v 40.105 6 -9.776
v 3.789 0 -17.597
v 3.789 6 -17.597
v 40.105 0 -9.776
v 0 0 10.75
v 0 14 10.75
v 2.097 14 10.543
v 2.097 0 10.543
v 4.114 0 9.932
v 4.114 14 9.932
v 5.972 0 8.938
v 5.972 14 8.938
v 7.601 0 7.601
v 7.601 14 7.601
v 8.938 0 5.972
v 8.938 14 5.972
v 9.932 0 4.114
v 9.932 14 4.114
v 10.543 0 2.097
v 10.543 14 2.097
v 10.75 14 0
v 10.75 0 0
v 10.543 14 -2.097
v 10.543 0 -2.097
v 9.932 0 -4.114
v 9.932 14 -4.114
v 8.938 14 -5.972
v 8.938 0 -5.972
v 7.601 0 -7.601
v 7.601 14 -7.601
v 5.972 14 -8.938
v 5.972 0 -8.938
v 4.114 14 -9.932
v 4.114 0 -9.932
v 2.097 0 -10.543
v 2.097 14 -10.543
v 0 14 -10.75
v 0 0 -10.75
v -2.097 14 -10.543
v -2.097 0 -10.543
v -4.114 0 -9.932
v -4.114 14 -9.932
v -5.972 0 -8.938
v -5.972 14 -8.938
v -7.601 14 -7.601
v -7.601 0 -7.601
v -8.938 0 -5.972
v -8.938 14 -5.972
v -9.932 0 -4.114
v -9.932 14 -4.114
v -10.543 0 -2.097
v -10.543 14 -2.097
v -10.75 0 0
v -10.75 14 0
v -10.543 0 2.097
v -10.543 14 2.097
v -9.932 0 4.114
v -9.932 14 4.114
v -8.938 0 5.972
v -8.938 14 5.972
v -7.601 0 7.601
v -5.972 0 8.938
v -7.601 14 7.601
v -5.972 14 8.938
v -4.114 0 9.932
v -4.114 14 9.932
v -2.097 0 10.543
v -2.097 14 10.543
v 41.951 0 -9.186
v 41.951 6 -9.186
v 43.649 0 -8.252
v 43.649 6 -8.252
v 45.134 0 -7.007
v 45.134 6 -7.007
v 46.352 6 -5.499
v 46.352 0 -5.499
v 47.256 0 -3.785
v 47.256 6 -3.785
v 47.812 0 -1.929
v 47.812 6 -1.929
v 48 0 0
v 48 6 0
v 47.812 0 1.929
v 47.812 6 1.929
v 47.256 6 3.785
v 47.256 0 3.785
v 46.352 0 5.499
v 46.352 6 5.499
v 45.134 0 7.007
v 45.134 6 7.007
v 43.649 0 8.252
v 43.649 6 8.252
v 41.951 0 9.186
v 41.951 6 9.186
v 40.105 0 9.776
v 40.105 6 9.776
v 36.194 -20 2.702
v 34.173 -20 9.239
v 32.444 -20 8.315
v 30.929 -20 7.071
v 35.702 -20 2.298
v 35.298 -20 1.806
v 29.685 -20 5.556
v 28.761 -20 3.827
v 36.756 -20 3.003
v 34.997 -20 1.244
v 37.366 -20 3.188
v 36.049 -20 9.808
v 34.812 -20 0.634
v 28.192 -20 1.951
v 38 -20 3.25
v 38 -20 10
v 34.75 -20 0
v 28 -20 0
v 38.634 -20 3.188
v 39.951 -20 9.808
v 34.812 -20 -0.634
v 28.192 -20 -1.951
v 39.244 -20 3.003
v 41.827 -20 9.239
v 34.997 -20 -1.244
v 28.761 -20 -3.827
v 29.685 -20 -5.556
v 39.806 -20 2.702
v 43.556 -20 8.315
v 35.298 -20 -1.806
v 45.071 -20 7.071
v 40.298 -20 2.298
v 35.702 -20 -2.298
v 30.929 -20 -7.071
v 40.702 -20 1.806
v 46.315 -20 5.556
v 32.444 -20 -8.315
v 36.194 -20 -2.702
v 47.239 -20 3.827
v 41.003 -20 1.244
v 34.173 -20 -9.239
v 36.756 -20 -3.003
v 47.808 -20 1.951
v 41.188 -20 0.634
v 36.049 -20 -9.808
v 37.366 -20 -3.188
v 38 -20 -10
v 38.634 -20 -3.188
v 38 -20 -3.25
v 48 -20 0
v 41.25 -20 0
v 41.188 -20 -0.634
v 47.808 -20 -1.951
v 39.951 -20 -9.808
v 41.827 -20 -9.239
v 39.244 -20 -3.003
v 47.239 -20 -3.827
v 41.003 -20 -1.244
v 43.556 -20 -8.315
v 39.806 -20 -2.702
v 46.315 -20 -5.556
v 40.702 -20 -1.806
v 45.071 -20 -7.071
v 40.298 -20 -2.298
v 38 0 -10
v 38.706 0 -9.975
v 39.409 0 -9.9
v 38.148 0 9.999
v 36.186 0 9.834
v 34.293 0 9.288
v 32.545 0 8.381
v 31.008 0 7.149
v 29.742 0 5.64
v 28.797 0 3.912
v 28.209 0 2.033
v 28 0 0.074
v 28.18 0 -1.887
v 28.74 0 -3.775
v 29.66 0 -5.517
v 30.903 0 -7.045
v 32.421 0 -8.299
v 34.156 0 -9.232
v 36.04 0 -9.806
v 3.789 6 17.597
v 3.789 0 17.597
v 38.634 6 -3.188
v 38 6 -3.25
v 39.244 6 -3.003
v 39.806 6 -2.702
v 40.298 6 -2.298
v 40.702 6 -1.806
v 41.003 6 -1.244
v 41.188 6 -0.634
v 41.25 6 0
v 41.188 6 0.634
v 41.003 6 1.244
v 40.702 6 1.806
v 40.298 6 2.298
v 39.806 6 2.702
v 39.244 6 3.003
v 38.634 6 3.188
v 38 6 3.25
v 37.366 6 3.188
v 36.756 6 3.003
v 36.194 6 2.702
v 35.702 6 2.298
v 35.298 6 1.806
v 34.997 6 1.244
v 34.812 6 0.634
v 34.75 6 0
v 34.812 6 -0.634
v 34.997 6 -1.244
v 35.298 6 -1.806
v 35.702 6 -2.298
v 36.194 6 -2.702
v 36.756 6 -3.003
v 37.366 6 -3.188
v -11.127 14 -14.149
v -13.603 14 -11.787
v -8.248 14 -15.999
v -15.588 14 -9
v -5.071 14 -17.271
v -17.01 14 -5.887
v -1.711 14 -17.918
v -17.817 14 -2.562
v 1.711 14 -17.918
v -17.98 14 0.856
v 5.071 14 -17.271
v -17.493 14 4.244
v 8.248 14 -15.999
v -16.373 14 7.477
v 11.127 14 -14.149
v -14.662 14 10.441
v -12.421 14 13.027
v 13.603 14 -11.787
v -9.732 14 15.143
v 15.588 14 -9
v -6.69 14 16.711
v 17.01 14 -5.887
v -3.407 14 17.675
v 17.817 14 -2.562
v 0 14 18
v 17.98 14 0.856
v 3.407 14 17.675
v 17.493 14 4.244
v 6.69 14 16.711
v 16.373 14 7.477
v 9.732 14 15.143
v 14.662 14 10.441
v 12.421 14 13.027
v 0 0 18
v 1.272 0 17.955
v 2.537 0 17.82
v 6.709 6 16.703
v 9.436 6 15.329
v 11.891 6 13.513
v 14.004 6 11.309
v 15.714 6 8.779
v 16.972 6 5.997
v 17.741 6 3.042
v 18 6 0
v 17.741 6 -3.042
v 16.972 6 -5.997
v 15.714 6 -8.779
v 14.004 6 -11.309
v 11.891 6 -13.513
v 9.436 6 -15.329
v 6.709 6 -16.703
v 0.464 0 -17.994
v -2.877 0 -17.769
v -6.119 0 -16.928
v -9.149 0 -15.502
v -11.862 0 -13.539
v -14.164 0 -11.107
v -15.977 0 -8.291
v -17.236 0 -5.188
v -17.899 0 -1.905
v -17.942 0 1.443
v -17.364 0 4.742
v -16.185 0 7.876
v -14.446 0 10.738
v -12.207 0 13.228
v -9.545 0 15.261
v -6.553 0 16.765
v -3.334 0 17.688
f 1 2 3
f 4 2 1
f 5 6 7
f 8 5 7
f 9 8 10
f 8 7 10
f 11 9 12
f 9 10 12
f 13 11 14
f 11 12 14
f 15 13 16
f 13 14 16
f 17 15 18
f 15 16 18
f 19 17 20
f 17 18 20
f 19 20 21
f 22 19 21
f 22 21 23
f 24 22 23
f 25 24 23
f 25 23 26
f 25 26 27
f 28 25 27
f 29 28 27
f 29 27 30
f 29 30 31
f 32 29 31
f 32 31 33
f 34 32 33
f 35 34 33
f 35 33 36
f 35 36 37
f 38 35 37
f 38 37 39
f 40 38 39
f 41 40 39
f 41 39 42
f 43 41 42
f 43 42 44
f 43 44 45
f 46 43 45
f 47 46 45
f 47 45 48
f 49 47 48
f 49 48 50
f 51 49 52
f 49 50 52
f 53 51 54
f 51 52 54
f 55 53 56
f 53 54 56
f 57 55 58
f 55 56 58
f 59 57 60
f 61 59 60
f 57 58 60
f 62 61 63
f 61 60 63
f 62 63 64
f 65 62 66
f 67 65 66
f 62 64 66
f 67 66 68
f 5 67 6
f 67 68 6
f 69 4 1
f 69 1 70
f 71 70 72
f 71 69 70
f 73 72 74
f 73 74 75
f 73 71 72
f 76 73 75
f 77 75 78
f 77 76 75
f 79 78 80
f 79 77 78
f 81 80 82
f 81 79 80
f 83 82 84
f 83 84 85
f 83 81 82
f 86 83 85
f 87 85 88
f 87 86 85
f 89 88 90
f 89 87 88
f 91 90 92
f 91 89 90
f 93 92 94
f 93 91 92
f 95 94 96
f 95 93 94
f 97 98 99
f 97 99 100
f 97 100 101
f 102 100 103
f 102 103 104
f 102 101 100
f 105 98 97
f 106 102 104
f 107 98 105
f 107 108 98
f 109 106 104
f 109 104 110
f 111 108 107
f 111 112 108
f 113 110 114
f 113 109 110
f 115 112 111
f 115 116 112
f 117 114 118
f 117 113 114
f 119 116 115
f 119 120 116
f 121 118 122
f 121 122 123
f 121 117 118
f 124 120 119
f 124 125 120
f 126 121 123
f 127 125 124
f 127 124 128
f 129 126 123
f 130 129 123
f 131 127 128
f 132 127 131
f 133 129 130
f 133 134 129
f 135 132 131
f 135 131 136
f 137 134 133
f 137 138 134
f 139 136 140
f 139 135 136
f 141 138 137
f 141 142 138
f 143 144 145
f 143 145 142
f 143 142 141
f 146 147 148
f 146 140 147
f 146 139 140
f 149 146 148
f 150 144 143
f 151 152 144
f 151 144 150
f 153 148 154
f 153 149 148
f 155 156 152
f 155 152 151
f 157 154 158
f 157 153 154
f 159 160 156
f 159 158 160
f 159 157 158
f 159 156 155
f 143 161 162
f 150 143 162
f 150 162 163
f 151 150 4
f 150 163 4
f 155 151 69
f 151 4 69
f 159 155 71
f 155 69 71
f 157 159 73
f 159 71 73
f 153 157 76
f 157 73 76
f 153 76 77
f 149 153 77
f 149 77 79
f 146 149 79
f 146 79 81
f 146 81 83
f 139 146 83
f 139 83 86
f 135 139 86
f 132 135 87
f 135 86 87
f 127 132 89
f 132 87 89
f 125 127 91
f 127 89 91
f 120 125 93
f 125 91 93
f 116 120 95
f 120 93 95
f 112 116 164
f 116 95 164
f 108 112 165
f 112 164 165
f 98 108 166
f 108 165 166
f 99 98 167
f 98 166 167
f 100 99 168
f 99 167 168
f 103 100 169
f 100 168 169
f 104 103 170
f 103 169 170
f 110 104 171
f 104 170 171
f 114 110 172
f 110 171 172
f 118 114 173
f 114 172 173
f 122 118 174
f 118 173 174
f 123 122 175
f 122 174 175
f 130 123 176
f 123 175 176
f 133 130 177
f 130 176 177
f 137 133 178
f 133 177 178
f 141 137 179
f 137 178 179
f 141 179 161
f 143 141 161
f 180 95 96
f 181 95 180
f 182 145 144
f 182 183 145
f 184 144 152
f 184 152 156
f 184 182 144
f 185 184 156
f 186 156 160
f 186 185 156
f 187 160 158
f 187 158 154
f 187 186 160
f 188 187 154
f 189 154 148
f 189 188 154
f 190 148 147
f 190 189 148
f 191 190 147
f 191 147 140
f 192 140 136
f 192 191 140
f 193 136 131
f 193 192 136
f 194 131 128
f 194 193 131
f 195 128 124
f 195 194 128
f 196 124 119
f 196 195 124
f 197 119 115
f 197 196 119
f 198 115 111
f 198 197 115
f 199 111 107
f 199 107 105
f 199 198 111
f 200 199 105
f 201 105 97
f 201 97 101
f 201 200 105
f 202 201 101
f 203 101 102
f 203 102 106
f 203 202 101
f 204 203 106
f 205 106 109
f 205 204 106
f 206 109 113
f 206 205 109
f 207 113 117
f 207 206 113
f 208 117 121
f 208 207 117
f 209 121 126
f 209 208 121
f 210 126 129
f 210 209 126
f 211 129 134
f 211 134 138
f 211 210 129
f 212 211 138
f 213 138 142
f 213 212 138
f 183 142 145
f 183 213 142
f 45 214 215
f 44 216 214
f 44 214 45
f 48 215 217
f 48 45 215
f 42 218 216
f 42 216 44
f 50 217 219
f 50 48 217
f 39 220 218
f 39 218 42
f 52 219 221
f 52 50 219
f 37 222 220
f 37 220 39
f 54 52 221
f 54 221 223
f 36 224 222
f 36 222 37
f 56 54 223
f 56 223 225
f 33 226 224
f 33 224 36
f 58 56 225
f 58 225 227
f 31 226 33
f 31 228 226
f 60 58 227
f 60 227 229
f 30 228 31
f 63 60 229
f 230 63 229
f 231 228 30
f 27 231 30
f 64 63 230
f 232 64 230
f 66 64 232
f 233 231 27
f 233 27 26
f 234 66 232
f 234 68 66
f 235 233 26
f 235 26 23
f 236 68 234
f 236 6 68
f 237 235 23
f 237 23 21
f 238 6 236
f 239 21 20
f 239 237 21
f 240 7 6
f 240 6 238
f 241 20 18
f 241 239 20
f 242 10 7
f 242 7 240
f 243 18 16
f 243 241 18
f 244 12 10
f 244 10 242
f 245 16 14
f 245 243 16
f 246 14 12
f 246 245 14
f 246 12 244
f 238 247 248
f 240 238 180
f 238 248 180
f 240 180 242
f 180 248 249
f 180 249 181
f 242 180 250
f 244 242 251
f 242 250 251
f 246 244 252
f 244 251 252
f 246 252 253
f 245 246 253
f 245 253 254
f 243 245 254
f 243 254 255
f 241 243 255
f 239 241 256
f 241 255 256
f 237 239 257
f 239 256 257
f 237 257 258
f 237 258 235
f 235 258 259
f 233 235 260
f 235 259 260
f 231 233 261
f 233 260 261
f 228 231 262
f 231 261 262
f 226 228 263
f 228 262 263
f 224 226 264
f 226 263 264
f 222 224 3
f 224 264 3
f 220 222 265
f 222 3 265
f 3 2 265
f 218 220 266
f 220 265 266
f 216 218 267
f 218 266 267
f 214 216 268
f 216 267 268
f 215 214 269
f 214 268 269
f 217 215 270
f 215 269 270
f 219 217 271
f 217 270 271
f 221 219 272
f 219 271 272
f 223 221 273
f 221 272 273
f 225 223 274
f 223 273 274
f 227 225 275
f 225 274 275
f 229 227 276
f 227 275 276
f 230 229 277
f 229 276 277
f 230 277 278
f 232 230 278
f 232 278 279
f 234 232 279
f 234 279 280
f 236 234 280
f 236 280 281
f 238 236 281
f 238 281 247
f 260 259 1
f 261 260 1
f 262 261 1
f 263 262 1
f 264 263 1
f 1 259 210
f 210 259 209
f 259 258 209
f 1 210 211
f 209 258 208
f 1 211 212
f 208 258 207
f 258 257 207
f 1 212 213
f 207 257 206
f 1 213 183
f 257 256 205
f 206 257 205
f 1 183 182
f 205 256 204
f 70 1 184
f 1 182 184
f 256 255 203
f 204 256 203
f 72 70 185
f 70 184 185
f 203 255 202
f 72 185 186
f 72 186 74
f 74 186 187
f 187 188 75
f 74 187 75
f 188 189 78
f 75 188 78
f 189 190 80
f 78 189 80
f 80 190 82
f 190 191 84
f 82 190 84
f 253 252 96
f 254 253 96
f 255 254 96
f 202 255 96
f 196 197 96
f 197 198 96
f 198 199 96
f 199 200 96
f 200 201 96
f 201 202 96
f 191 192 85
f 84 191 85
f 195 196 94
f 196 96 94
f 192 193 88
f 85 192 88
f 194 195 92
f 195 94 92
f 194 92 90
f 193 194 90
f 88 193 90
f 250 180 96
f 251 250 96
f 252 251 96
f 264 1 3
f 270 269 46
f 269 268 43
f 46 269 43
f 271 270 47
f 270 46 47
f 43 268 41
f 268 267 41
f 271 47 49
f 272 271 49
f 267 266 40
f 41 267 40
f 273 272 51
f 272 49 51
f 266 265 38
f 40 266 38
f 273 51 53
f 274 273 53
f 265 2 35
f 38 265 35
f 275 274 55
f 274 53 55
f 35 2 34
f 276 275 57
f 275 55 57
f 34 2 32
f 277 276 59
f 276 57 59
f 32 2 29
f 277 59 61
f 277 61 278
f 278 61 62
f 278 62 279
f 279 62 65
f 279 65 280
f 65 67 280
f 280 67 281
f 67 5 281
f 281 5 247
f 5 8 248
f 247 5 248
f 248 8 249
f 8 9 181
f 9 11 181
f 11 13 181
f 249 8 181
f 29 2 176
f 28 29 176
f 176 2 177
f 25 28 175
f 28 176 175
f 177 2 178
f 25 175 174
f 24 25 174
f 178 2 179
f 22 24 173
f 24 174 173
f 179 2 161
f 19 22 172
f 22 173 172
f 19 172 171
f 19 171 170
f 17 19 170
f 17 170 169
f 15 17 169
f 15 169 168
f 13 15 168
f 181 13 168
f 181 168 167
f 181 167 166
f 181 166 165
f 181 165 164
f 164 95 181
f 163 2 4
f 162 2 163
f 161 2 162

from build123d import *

# Parameters (mm, degrees)
SKETCH1_R           = 18
BOSS_EXTRUDE1_DEPTH = 14
SKETCH2_R           = 3.25
BOSS_EXTRUDE2_DEPTH = 6
SKETCH3_R           = 10
SKETCH3_R_2         = 3.25
BOSS_EXTRUDE3_DEPTH = 20
CUT_EXTRUDE1_REACH  = 63.514
SKETCH4_R           = 10.75


with BuildPart() as part:
    # Sketch1 → Boss-Extrude1 (new body)
    with BuildSketch(Plane(origin=(0, 0, 0), x_dir=(1, 0, 0), z_dir=(0, 1, 0))):
        with Locations(Location((0, 0, 0), (0, 0, 270))):
            Circle(SKETCH1_R)
    extrude(amount=BOSS_EXTRUDE1_DEPTH)

    # Sketch2 → Boss-Extrude2 (add)
    with BuildSketch(Plane.XZ):
        with BuildLine():
            Line((40.105263158, 9.775881906), (3.789473684, 17.59658743))
            ThreePointArc((3.789473684, 17.59658743), (14.003758894, 11.309055524), (18, 0))
            ThreePointArc((18, 0), (14.003758894, -11.309055524), (3.789473684, -17.59658743))
            Line((3.789473684, -17.59658743), (40.105263158, -9.775881906))
            ThreePointArc((40.105263158, -9.775881906), (48, 0), (40.105263158, 9.775881906))
        make_face()
        with Locations(Location((38, 0, 0), (0, 0, 270))):
            Circle(SKETCH2_R, mode=Mode.SUBTRACT)
    extrude(amount=-BOSS_EXTRUDE2_DEPTH)

    # Sketch3 → Boss-Extrude3 (add)
    with BuildSketch(Plane.XZ):
        with Locations(Location((38, 0, 0), (0, 0, 270))):
            Circle(SKETCH3_R)
        with Locations(Location((38, 0, 0), (0, 0, 270))):
            Circle(SKETCH3_R_2, mode=Mode.SUBTRACT)
    extrude(amount=BOSS_EXTRUDE3_DEPTH)

    # Sketch4 → Cut-Extrude1 (cut, up to next)
    with BuildSketch(Plane(origin=(0, 14, 0), x_dir=(1, 0, 0), z_dir=(0, 1, 0)), mode=Mode.PRIVATE) as cut_extrude1_sk1:
        with Locations(Location((0, 0, 0), (0, 0, 270))):
            Circle(SKETCH4_R)
    cut_extrude1_tool1 = extrude(cut_extrude1_sk1.sketch, amount=-CUT_EXTRUDE1_REACH, mode=Mode.PRIVATE) & part.part
    add(cut_extrude1_tool1.solids().sort_by_distance((0, 14, 0))[0], mode=Mode.SUBTRACT)


solid = part.part
